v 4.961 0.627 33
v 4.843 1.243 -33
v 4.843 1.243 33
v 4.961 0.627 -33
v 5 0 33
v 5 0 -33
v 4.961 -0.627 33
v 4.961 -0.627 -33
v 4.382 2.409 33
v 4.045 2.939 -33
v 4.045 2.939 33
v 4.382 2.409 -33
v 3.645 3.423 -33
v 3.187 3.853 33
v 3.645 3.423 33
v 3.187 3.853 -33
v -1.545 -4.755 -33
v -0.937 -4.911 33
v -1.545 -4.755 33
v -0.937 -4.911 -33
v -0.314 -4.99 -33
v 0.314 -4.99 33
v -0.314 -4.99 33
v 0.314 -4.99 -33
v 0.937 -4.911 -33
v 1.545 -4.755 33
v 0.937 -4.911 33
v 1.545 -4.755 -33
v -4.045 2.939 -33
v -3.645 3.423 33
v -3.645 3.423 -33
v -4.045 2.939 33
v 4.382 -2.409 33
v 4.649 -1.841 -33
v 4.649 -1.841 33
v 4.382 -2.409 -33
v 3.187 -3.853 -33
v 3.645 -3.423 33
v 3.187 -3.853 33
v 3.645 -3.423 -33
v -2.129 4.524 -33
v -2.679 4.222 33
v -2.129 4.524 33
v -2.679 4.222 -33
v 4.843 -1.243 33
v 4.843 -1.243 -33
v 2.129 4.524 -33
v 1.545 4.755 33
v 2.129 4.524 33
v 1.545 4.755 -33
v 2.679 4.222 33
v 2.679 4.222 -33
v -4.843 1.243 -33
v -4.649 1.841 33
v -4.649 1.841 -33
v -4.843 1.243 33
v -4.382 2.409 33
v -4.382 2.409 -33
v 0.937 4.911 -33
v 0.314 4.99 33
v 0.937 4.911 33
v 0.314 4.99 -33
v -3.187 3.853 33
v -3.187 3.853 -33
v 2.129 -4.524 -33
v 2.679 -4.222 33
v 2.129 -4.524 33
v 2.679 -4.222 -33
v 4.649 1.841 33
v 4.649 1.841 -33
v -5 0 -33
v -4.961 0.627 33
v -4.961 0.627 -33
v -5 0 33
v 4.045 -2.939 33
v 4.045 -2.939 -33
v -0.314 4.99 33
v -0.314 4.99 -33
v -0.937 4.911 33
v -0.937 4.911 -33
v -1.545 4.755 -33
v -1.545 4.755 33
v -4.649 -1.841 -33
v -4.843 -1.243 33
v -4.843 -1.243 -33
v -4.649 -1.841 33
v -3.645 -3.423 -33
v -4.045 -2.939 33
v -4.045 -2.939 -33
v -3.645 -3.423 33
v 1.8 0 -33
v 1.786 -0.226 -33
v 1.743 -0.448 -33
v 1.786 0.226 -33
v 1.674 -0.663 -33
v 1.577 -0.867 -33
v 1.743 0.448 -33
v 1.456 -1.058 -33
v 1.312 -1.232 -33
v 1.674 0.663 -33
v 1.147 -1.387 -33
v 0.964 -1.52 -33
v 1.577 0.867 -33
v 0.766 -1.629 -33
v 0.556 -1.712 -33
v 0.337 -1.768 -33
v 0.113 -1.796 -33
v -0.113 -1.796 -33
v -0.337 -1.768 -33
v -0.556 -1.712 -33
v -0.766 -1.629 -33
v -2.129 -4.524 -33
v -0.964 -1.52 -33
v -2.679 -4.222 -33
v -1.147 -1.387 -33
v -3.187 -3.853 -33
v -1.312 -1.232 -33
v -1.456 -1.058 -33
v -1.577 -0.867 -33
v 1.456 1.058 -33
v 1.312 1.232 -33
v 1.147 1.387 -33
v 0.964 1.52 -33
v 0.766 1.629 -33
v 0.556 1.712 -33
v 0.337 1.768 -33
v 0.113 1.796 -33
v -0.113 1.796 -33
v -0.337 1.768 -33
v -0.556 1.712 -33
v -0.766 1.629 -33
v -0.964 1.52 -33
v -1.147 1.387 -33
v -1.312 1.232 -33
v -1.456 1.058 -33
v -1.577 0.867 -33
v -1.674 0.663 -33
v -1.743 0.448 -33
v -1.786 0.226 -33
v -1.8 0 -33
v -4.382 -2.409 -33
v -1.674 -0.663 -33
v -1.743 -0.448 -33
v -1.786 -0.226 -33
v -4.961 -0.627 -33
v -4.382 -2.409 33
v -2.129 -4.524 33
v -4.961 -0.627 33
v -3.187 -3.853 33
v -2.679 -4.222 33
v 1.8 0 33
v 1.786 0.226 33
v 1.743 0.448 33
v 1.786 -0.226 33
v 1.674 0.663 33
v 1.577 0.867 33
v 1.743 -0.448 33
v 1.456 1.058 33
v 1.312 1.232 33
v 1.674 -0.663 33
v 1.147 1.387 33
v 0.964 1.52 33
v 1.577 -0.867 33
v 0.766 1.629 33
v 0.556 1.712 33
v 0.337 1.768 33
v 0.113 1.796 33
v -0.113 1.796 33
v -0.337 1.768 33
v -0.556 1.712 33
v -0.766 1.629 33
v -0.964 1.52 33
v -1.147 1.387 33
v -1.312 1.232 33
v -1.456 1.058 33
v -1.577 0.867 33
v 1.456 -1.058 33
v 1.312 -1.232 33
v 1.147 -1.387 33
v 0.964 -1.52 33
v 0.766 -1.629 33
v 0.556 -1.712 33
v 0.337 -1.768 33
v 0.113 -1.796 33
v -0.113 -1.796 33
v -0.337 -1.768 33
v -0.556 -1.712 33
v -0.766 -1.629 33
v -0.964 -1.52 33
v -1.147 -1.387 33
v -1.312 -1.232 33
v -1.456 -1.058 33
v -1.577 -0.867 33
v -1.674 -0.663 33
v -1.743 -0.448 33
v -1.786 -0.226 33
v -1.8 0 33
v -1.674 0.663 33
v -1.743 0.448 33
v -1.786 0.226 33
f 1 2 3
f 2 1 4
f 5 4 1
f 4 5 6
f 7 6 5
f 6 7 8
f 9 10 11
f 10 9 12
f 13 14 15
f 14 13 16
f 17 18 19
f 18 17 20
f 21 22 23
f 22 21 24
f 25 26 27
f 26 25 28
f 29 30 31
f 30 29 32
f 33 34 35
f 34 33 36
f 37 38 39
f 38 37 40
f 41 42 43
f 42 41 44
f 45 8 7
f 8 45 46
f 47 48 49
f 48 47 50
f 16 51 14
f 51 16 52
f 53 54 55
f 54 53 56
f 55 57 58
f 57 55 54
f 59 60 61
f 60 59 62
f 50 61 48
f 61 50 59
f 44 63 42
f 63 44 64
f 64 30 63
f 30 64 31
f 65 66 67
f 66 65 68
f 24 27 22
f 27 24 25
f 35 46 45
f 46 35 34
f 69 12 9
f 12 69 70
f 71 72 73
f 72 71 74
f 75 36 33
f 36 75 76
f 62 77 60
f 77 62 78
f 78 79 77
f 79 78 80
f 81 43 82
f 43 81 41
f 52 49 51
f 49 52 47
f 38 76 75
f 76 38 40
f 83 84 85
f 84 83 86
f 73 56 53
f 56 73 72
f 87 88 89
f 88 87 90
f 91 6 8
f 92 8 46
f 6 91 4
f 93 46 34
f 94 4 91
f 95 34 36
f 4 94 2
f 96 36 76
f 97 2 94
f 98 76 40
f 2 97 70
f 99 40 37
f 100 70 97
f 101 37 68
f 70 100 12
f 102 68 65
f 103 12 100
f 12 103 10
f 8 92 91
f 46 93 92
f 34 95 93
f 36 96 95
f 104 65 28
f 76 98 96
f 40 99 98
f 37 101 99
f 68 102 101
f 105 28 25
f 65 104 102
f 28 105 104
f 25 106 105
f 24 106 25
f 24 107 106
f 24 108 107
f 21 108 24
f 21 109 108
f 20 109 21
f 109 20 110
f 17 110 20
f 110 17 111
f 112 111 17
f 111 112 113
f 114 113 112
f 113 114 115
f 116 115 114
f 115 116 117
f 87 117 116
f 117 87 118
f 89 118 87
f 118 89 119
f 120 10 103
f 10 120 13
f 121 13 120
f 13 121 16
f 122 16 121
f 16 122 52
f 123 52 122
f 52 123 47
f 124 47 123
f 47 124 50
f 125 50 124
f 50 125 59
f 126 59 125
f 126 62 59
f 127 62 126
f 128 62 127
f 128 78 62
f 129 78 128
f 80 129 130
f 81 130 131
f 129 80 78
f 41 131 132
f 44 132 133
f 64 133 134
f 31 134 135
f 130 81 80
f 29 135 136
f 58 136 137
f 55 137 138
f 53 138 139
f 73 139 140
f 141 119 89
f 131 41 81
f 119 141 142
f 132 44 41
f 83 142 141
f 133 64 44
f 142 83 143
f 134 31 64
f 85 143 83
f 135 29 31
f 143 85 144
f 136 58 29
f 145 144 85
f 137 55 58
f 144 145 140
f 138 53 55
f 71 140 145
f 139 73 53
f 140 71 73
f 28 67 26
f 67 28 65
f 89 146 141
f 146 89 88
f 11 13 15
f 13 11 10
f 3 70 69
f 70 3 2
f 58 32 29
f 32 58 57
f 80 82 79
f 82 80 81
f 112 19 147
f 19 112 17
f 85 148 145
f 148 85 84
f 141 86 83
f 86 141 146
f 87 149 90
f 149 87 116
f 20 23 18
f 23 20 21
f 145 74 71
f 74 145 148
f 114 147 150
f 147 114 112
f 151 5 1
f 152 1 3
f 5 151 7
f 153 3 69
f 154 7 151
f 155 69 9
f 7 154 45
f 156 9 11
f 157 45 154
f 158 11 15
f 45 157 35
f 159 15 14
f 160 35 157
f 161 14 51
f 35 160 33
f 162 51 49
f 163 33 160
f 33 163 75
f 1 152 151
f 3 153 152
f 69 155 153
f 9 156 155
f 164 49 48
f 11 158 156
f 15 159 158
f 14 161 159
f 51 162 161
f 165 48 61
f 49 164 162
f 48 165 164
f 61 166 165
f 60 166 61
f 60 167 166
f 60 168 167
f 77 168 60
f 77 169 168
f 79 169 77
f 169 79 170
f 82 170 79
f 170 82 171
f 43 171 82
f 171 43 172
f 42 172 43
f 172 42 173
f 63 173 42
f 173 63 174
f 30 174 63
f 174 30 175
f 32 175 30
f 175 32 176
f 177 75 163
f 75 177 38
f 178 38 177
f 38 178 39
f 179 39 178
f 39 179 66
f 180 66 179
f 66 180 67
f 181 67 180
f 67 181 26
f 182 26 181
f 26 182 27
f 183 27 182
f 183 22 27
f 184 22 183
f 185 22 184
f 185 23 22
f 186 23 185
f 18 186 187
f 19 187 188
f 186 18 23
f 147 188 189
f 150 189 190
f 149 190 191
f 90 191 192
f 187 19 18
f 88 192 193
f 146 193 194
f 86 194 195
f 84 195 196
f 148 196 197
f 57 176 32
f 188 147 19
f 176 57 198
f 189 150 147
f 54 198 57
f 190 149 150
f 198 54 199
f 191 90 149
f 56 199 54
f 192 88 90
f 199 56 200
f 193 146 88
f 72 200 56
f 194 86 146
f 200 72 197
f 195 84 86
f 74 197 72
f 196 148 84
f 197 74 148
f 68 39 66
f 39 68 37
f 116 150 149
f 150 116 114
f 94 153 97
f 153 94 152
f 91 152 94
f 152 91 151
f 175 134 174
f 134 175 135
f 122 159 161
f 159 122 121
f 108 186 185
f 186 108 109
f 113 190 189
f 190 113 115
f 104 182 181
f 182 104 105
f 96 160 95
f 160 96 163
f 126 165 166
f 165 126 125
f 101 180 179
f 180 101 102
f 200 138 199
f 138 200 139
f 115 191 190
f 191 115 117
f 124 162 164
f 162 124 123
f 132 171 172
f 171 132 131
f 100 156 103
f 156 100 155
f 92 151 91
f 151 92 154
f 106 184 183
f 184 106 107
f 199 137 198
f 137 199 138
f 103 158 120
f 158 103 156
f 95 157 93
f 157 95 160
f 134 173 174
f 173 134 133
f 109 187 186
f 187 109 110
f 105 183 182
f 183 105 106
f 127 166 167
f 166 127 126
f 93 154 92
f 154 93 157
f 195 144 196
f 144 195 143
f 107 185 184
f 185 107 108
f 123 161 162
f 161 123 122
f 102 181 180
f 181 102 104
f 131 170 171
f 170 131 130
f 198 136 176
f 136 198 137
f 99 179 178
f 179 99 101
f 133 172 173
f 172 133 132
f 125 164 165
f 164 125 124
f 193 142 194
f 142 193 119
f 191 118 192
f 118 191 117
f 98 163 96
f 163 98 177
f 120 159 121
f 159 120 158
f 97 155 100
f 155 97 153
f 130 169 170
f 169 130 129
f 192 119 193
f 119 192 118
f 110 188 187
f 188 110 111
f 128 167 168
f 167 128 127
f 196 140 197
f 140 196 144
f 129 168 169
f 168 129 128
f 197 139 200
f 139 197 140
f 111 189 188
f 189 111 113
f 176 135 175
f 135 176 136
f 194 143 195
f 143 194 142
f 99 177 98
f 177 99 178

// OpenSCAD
$fn = 50;


difference() {
	union() {
		translate(v = [0, 0, -33.0000000000]) {
			cylinder(h = 66, r = 5.0000000000);
		}
	}
	union() {
		#translate(v = [0, 0, -100.0000000000]) {
			cylinder(h = 200, r = 1.8000000000);
		}
	}
}
